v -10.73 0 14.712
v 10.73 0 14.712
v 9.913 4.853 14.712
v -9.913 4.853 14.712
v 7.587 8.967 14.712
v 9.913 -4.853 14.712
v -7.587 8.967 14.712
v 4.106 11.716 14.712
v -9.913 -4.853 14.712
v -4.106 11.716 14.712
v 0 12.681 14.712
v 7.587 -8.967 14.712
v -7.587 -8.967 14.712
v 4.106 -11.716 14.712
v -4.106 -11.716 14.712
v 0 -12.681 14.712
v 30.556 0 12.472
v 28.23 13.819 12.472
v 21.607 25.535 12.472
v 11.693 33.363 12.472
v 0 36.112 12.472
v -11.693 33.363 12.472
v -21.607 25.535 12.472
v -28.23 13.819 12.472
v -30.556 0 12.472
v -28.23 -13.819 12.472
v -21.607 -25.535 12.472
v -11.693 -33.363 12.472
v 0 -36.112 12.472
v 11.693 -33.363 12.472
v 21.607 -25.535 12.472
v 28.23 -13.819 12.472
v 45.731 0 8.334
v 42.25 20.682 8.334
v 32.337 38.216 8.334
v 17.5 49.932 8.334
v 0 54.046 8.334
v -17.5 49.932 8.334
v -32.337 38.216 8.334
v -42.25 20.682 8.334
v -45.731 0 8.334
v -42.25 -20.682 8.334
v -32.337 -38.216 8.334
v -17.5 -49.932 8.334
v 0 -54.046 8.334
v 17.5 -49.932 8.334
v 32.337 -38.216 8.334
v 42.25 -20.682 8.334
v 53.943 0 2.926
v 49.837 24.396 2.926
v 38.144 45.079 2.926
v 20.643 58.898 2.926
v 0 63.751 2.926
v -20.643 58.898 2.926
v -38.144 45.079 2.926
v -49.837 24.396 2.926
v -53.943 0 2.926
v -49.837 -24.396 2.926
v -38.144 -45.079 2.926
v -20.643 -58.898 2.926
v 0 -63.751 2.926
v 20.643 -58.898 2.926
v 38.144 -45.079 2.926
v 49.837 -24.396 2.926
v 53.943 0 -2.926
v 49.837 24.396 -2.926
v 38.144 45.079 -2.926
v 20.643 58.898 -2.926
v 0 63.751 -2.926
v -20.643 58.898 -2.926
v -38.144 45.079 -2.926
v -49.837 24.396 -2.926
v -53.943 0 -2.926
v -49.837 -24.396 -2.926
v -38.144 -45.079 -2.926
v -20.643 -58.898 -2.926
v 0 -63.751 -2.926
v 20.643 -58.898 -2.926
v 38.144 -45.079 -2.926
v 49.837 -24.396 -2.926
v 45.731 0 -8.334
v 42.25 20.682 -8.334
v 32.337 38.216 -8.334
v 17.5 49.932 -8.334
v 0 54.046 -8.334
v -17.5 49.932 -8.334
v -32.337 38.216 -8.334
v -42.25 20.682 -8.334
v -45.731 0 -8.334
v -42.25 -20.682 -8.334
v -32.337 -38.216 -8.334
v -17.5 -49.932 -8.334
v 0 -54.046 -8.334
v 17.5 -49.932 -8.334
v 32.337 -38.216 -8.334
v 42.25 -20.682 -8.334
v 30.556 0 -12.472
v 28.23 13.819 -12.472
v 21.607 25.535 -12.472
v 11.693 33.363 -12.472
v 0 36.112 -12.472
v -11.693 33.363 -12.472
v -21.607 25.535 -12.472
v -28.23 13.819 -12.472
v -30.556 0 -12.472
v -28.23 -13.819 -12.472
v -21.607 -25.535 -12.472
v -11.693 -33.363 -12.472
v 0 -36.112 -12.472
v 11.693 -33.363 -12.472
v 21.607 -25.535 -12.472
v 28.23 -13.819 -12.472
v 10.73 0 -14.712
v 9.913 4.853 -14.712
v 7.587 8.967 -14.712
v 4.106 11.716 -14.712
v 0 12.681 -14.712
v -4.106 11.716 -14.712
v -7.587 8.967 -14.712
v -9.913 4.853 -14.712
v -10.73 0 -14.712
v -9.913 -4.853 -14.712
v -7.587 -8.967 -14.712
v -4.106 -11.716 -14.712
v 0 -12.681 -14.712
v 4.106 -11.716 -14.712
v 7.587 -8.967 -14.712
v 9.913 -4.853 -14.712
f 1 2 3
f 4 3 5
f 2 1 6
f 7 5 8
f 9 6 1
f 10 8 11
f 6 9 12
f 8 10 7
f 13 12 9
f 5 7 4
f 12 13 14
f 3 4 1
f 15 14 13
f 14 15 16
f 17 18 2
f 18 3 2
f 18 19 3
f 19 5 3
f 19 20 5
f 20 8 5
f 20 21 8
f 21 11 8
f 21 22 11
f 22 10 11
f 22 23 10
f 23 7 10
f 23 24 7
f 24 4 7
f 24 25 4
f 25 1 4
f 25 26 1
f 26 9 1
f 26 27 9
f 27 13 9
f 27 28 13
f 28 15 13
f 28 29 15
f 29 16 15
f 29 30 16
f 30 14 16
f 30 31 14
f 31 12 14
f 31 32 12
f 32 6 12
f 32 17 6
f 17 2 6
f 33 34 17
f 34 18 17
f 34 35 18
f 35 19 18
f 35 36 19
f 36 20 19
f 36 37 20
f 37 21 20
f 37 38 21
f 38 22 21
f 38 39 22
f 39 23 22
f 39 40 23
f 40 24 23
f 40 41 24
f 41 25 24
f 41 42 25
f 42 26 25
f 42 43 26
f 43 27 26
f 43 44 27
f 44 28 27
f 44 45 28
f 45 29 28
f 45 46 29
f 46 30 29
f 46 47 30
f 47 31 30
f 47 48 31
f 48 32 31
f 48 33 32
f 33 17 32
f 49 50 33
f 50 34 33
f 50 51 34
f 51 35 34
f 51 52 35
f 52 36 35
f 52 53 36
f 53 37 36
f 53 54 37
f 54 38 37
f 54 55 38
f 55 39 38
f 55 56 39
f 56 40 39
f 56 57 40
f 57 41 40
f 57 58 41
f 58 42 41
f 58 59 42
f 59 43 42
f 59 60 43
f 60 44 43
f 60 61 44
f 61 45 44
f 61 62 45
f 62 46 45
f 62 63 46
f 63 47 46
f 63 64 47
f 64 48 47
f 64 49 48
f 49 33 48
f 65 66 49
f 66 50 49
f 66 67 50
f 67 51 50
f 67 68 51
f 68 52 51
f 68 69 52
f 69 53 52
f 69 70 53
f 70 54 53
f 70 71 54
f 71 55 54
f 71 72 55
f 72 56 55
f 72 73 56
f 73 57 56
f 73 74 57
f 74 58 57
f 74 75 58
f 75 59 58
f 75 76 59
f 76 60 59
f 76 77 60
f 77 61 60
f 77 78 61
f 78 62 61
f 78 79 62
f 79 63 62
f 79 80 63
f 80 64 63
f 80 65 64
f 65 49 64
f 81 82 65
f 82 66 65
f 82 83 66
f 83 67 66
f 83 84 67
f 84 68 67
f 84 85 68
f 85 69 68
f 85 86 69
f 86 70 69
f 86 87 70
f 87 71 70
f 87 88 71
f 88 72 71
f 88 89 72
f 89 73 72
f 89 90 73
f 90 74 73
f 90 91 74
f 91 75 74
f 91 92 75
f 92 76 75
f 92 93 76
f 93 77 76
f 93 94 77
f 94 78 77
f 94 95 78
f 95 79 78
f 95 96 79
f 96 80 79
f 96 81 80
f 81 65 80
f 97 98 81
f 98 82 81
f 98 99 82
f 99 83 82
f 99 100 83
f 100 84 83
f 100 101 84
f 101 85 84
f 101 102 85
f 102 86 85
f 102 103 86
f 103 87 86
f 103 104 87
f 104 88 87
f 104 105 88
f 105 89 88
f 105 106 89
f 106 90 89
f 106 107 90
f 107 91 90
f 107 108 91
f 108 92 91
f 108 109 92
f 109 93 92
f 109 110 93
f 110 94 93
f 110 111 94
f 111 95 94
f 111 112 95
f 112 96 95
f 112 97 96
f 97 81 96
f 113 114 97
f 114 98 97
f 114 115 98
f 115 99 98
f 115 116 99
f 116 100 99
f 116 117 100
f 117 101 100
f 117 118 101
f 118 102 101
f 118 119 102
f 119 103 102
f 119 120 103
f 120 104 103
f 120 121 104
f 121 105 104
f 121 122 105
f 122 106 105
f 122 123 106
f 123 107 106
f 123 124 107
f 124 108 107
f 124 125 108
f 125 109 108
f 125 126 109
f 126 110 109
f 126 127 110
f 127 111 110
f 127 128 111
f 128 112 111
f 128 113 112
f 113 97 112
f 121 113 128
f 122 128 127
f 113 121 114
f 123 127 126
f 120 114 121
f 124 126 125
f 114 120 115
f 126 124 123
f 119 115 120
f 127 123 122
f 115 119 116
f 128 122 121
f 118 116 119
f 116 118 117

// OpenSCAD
// Generated by SolidPython 1.0.1 on 2020-07-29 00:46:49


scale(v = [11, 13, 3]) {
	sphere(r = 5);
}
/***********************************************
*********      SolidPython code:      **********
************************************************
 
# import packages: SolidPython
from solid import *
from solid.utils import *
from itertools import chain, combinations, permutations


class Resize:

    def __init__(self, scad_file):
        self.scad_file = scad_file
        #self.scad_file = import_scad(scad_file)
        # cone/cylinder param:
        self.r1 = 0
        self.r2 = 0
        self.h = 0
        # rectangular prism param:
        self.w = 0
        self.l = 0
        # ellipse param:
        self.r = 0

    # import OpenScad code (file name corresponds to shape)


    # classify shape + parameters
    def assign(self, param1, param2, param3):
        if self.scad_file == 'cone.scad':
            self.r1 = param1
            self.r2 = param2
            self.h = param3
        elif self.scad_file == 'cylinder.scad':
            self.r1 = param1
            self.r2 = param2
            self.h = param3
        elif self.scad_file == 'rectangularPrism.scad':
            self.h = param1
            self.l = param2
            self.w = param3
        else:
            self.r = param1
            self.h = param2

    # resize parameters
    def iterate(self):
        x = range(3, 20, 2)
        i = 1
        if self.scad_file == 'cone.scad':
            tempList = list(permutations(x, 2))
            for temp in tempList:
                param1 = temp[0]
                param2 = temp[1]
                filepath = 'produced_scad_files/' + 'cone' + str(param1) + '_' + str(param2) + '_' + '.scad'
                scad_render_to_file(cylinder(h=param1, r1=param2, r2=0), filepath)

        elif self.scad_file == 'cylinder.scad':
            tempList = list(permutations(x, 3))
            for temp in tempList:
                param1 = temp[0]
                param2 = temp[1]
                filepath = 'produced_scad_files/' + 'cylinder' + str(param1) + '_' + str(param2) + '_' + '.scad'
                scad_render_to_file(cylinder(h=param1, r1=param2, r2=param2), filepath)

        elif self.scad_file == 'rectangularPrism.scad':
            tempList = list(permutations(x, 3))
            for temp in tempList:
                param1 = temp[0]
                param2 = temp[1]
                param3 = temp[2]
                filepath = 'produced_scad_files/' + 'rectangularPrism' + str(param1) + '_' + str(param2) + '_' + str(
                    param3) + '.scad'
                scad_render_to_file(cube(size=(param1, param2, param3)), filepath)

        elif self.scad_file == 'ellipse.scad':
            tempList = list(permutations(x, 4))
            for temp in tempList:
                param1 = temp[0]
                param2 = temp[1]
                param3 = temp[2]
                param4 = temp[3]
                filepath = 'produced_scad_files/' + 'ellipse' + str(param1) + '_' + str(param2) + '_' + str(param3) + '_' + str(param4) + '.scad'
                scad_render_to_file(scale([param1, param2, param3])(sphere(r=param4)), filepath)

    def render_to_scadfile(self):
        scad_render_to_file(scad, 'example.scad') 
 
************************************************/
